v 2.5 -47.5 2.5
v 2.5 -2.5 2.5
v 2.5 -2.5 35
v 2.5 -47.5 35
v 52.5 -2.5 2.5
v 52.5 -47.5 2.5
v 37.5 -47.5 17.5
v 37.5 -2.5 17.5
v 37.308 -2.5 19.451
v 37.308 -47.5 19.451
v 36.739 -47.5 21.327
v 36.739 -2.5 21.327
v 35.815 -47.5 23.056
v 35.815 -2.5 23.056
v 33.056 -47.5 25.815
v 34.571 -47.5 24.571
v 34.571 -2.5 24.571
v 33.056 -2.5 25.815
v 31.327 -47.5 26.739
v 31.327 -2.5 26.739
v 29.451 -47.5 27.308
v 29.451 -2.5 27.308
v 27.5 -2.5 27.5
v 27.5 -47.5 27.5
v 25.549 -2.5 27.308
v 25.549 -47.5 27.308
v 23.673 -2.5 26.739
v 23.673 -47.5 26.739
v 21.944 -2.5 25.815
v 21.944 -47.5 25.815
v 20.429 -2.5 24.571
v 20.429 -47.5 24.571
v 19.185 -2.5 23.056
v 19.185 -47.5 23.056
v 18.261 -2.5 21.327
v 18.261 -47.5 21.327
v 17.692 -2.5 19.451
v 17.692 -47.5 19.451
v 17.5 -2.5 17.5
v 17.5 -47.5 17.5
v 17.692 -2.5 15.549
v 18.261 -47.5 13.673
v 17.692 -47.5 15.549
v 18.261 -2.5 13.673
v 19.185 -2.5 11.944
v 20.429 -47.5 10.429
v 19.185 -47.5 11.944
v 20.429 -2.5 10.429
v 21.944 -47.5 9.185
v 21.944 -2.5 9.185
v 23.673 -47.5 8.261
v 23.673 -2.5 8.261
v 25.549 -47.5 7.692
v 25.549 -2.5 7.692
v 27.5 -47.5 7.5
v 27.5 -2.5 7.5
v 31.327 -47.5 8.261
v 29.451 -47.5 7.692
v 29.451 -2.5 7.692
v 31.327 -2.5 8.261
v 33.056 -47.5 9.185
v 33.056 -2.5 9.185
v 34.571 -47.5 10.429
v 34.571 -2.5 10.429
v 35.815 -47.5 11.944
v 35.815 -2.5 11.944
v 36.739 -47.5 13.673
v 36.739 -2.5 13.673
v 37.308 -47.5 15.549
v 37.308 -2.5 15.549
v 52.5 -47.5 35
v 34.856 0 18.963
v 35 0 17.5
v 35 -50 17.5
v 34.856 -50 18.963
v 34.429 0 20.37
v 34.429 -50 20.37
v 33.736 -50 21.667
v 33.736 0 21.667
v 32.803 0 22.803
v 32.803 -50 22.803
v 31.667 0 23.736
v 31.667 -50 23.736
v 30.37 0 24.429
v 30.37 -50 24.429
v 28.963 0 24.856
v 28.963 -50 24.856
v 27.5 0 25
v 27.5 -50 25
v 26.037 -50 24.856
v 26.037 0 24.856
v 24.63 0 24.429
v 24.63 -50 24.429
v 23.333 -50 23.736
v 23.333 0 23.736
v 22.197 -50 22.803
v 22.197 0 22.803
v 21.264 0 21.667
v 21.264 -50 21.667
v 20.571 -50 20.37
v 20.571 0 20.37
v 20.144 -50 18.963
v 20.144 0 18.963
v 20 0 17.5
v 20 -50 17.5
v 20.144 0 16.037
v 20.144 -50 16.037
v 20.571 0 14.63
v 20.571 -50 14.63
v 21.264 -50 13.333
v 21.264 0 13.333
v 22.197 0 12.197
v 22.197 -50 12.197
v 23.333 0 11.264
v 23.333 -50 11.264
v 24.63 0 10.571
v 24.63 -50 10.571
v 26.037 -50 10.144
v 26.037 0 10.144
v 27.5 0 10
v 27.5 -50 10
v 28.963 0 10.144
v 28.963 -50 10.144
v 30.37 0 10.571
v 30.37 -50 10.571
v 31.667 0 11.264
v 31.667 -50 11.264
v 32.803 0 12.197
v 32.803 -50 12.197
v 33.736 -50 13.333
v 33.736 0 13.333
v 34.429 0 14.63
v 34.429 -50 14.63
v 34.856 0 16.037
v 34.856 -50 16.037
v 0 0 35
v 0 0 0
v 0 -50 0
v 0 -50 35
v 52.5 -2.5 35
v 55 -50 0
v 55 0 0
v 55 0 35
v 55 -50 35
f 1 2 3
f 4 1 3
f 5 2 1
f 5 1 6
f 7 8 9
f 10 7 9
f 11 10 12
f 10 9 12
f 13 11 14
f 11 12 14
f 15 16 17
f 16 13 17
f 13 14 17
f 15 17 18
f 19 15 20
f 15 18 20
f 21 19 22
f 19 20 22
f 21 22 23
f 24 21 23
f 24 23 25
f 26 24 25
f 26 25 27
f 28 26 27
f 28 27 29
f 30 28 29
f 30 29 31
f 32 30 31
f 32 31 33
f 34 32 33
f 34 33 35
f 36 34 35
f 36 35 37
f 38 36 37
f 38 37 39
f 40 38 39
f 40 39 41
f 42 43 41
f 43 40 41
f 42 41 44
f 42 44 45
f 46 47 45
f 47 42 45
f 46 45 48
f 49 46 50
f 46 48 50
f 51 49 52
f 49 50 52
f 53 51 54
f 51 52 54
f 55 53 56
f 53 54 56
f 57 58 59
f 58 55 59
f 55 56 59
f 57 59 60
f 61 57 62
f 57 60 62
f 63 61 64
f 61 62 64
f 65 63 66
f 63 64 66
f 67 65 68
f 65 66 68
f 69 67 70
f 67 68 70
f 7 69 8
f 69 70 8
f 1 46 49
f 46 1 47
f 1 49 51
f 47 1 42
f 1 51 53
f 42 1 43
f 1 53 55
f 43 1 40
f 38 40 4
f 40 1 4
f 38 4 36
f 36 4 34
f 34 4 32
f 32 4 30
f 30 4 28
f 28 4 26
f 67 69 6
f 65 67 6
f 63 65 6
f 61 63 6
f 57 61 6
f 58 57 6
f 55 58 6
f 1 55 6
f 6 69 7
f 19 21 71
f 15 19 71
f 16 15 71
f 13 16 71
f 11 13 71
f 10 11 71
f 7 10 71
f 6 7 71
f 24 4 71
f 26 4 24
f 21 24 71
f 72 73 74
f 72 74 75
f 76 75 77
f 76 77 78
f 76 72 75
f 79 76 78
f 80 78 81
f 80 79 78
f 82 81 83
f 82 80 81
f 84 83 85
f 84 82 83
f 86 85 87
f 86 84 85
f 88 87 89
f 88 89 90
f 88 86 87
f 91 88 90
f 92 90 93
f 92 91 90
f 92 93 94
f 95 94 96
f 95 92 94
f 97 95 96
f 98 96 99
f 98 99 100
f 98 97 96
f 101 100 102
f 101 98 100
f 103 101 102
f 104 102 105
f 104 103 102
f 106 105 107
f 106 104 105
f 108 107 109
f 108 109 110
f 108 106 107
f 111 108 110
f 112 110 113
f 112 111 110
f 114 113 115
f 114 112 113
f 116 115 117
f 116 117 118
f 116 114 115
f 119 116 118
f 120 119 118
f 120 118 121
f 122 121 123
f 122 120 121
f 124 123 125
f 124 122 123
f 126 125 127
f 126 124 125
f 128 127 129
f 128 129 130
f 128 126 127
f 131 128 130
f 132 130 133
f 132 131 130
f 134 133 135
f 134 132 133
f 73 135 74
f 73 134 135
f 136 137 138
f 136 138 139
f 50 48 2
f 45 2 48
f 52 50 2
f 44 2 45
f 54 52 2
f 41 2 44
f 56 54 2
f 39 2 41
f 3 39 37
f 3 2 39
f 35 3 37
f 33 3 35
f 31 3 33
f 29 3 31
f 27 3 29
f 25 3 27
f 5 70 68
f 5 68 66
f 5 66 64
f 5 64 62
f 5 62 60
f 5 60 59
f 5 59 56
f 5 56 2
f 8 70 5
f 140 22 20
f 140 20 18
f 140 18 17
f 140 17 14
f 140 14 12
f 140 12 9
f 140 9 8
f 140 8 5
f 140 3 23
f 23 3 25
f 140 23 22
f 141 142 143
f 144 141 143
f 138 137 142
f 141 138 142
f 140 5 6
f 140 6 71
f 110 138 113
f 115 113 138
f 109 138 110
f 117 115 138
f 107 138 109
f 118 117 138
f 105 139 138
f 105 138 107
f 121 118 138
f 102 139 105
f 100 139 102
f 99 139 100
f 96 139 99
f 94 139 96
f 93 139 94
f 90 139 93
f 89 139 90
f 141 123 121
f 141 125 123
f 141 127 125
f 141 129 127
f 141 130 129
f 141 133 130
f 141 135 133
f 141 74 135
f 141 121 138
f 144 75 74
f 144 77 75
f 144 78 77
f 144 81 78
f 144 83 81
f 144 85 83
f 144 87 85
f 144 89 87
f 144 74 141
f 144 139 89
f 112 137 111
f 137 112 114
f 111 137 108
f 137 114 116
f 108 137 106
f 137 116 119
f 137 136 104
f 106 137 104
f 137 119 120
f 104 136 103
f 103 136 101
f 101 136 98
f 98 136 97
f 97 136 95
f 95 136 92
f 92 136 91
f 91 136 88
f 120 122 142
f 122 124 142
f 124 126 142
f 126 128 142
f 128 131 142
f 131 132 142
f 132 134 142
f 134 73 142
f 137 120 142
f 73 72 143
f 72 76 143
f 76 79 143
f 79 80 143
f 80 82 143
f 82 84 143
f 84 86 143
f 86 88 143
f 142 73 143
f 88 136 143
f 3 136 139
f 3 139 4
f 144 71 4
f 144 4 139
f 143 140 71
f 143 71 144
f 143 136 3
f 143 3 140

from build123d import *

# Parameters (mm, degrees)
F0_W     = 55
F0_H     = 35
F0_R     = 7.5
F1_DEPTH = 50
F2_T     = -2.5


with BuildPart() as f1:
    # F0 (on Front) → F1 (new body)
    with BuildSketch(Plane.XZ):
        with Locations((27.5, 17.5)):
            Rectangle(F0_W, F0_H)
        with Locations((27.5, 17.5)):
            Circle(F0_R, mode=Mode.SUBTRACT)
    extrude(amount=F1_DEPTH)

    # F2
    f2_openings = [f1.faces().sort_by_distance(p)[0] for p in [
        (27.5, -25, 35),
    ]]
    offset(amount=F2_T, openings=f2_openings)


solid = f1.part
